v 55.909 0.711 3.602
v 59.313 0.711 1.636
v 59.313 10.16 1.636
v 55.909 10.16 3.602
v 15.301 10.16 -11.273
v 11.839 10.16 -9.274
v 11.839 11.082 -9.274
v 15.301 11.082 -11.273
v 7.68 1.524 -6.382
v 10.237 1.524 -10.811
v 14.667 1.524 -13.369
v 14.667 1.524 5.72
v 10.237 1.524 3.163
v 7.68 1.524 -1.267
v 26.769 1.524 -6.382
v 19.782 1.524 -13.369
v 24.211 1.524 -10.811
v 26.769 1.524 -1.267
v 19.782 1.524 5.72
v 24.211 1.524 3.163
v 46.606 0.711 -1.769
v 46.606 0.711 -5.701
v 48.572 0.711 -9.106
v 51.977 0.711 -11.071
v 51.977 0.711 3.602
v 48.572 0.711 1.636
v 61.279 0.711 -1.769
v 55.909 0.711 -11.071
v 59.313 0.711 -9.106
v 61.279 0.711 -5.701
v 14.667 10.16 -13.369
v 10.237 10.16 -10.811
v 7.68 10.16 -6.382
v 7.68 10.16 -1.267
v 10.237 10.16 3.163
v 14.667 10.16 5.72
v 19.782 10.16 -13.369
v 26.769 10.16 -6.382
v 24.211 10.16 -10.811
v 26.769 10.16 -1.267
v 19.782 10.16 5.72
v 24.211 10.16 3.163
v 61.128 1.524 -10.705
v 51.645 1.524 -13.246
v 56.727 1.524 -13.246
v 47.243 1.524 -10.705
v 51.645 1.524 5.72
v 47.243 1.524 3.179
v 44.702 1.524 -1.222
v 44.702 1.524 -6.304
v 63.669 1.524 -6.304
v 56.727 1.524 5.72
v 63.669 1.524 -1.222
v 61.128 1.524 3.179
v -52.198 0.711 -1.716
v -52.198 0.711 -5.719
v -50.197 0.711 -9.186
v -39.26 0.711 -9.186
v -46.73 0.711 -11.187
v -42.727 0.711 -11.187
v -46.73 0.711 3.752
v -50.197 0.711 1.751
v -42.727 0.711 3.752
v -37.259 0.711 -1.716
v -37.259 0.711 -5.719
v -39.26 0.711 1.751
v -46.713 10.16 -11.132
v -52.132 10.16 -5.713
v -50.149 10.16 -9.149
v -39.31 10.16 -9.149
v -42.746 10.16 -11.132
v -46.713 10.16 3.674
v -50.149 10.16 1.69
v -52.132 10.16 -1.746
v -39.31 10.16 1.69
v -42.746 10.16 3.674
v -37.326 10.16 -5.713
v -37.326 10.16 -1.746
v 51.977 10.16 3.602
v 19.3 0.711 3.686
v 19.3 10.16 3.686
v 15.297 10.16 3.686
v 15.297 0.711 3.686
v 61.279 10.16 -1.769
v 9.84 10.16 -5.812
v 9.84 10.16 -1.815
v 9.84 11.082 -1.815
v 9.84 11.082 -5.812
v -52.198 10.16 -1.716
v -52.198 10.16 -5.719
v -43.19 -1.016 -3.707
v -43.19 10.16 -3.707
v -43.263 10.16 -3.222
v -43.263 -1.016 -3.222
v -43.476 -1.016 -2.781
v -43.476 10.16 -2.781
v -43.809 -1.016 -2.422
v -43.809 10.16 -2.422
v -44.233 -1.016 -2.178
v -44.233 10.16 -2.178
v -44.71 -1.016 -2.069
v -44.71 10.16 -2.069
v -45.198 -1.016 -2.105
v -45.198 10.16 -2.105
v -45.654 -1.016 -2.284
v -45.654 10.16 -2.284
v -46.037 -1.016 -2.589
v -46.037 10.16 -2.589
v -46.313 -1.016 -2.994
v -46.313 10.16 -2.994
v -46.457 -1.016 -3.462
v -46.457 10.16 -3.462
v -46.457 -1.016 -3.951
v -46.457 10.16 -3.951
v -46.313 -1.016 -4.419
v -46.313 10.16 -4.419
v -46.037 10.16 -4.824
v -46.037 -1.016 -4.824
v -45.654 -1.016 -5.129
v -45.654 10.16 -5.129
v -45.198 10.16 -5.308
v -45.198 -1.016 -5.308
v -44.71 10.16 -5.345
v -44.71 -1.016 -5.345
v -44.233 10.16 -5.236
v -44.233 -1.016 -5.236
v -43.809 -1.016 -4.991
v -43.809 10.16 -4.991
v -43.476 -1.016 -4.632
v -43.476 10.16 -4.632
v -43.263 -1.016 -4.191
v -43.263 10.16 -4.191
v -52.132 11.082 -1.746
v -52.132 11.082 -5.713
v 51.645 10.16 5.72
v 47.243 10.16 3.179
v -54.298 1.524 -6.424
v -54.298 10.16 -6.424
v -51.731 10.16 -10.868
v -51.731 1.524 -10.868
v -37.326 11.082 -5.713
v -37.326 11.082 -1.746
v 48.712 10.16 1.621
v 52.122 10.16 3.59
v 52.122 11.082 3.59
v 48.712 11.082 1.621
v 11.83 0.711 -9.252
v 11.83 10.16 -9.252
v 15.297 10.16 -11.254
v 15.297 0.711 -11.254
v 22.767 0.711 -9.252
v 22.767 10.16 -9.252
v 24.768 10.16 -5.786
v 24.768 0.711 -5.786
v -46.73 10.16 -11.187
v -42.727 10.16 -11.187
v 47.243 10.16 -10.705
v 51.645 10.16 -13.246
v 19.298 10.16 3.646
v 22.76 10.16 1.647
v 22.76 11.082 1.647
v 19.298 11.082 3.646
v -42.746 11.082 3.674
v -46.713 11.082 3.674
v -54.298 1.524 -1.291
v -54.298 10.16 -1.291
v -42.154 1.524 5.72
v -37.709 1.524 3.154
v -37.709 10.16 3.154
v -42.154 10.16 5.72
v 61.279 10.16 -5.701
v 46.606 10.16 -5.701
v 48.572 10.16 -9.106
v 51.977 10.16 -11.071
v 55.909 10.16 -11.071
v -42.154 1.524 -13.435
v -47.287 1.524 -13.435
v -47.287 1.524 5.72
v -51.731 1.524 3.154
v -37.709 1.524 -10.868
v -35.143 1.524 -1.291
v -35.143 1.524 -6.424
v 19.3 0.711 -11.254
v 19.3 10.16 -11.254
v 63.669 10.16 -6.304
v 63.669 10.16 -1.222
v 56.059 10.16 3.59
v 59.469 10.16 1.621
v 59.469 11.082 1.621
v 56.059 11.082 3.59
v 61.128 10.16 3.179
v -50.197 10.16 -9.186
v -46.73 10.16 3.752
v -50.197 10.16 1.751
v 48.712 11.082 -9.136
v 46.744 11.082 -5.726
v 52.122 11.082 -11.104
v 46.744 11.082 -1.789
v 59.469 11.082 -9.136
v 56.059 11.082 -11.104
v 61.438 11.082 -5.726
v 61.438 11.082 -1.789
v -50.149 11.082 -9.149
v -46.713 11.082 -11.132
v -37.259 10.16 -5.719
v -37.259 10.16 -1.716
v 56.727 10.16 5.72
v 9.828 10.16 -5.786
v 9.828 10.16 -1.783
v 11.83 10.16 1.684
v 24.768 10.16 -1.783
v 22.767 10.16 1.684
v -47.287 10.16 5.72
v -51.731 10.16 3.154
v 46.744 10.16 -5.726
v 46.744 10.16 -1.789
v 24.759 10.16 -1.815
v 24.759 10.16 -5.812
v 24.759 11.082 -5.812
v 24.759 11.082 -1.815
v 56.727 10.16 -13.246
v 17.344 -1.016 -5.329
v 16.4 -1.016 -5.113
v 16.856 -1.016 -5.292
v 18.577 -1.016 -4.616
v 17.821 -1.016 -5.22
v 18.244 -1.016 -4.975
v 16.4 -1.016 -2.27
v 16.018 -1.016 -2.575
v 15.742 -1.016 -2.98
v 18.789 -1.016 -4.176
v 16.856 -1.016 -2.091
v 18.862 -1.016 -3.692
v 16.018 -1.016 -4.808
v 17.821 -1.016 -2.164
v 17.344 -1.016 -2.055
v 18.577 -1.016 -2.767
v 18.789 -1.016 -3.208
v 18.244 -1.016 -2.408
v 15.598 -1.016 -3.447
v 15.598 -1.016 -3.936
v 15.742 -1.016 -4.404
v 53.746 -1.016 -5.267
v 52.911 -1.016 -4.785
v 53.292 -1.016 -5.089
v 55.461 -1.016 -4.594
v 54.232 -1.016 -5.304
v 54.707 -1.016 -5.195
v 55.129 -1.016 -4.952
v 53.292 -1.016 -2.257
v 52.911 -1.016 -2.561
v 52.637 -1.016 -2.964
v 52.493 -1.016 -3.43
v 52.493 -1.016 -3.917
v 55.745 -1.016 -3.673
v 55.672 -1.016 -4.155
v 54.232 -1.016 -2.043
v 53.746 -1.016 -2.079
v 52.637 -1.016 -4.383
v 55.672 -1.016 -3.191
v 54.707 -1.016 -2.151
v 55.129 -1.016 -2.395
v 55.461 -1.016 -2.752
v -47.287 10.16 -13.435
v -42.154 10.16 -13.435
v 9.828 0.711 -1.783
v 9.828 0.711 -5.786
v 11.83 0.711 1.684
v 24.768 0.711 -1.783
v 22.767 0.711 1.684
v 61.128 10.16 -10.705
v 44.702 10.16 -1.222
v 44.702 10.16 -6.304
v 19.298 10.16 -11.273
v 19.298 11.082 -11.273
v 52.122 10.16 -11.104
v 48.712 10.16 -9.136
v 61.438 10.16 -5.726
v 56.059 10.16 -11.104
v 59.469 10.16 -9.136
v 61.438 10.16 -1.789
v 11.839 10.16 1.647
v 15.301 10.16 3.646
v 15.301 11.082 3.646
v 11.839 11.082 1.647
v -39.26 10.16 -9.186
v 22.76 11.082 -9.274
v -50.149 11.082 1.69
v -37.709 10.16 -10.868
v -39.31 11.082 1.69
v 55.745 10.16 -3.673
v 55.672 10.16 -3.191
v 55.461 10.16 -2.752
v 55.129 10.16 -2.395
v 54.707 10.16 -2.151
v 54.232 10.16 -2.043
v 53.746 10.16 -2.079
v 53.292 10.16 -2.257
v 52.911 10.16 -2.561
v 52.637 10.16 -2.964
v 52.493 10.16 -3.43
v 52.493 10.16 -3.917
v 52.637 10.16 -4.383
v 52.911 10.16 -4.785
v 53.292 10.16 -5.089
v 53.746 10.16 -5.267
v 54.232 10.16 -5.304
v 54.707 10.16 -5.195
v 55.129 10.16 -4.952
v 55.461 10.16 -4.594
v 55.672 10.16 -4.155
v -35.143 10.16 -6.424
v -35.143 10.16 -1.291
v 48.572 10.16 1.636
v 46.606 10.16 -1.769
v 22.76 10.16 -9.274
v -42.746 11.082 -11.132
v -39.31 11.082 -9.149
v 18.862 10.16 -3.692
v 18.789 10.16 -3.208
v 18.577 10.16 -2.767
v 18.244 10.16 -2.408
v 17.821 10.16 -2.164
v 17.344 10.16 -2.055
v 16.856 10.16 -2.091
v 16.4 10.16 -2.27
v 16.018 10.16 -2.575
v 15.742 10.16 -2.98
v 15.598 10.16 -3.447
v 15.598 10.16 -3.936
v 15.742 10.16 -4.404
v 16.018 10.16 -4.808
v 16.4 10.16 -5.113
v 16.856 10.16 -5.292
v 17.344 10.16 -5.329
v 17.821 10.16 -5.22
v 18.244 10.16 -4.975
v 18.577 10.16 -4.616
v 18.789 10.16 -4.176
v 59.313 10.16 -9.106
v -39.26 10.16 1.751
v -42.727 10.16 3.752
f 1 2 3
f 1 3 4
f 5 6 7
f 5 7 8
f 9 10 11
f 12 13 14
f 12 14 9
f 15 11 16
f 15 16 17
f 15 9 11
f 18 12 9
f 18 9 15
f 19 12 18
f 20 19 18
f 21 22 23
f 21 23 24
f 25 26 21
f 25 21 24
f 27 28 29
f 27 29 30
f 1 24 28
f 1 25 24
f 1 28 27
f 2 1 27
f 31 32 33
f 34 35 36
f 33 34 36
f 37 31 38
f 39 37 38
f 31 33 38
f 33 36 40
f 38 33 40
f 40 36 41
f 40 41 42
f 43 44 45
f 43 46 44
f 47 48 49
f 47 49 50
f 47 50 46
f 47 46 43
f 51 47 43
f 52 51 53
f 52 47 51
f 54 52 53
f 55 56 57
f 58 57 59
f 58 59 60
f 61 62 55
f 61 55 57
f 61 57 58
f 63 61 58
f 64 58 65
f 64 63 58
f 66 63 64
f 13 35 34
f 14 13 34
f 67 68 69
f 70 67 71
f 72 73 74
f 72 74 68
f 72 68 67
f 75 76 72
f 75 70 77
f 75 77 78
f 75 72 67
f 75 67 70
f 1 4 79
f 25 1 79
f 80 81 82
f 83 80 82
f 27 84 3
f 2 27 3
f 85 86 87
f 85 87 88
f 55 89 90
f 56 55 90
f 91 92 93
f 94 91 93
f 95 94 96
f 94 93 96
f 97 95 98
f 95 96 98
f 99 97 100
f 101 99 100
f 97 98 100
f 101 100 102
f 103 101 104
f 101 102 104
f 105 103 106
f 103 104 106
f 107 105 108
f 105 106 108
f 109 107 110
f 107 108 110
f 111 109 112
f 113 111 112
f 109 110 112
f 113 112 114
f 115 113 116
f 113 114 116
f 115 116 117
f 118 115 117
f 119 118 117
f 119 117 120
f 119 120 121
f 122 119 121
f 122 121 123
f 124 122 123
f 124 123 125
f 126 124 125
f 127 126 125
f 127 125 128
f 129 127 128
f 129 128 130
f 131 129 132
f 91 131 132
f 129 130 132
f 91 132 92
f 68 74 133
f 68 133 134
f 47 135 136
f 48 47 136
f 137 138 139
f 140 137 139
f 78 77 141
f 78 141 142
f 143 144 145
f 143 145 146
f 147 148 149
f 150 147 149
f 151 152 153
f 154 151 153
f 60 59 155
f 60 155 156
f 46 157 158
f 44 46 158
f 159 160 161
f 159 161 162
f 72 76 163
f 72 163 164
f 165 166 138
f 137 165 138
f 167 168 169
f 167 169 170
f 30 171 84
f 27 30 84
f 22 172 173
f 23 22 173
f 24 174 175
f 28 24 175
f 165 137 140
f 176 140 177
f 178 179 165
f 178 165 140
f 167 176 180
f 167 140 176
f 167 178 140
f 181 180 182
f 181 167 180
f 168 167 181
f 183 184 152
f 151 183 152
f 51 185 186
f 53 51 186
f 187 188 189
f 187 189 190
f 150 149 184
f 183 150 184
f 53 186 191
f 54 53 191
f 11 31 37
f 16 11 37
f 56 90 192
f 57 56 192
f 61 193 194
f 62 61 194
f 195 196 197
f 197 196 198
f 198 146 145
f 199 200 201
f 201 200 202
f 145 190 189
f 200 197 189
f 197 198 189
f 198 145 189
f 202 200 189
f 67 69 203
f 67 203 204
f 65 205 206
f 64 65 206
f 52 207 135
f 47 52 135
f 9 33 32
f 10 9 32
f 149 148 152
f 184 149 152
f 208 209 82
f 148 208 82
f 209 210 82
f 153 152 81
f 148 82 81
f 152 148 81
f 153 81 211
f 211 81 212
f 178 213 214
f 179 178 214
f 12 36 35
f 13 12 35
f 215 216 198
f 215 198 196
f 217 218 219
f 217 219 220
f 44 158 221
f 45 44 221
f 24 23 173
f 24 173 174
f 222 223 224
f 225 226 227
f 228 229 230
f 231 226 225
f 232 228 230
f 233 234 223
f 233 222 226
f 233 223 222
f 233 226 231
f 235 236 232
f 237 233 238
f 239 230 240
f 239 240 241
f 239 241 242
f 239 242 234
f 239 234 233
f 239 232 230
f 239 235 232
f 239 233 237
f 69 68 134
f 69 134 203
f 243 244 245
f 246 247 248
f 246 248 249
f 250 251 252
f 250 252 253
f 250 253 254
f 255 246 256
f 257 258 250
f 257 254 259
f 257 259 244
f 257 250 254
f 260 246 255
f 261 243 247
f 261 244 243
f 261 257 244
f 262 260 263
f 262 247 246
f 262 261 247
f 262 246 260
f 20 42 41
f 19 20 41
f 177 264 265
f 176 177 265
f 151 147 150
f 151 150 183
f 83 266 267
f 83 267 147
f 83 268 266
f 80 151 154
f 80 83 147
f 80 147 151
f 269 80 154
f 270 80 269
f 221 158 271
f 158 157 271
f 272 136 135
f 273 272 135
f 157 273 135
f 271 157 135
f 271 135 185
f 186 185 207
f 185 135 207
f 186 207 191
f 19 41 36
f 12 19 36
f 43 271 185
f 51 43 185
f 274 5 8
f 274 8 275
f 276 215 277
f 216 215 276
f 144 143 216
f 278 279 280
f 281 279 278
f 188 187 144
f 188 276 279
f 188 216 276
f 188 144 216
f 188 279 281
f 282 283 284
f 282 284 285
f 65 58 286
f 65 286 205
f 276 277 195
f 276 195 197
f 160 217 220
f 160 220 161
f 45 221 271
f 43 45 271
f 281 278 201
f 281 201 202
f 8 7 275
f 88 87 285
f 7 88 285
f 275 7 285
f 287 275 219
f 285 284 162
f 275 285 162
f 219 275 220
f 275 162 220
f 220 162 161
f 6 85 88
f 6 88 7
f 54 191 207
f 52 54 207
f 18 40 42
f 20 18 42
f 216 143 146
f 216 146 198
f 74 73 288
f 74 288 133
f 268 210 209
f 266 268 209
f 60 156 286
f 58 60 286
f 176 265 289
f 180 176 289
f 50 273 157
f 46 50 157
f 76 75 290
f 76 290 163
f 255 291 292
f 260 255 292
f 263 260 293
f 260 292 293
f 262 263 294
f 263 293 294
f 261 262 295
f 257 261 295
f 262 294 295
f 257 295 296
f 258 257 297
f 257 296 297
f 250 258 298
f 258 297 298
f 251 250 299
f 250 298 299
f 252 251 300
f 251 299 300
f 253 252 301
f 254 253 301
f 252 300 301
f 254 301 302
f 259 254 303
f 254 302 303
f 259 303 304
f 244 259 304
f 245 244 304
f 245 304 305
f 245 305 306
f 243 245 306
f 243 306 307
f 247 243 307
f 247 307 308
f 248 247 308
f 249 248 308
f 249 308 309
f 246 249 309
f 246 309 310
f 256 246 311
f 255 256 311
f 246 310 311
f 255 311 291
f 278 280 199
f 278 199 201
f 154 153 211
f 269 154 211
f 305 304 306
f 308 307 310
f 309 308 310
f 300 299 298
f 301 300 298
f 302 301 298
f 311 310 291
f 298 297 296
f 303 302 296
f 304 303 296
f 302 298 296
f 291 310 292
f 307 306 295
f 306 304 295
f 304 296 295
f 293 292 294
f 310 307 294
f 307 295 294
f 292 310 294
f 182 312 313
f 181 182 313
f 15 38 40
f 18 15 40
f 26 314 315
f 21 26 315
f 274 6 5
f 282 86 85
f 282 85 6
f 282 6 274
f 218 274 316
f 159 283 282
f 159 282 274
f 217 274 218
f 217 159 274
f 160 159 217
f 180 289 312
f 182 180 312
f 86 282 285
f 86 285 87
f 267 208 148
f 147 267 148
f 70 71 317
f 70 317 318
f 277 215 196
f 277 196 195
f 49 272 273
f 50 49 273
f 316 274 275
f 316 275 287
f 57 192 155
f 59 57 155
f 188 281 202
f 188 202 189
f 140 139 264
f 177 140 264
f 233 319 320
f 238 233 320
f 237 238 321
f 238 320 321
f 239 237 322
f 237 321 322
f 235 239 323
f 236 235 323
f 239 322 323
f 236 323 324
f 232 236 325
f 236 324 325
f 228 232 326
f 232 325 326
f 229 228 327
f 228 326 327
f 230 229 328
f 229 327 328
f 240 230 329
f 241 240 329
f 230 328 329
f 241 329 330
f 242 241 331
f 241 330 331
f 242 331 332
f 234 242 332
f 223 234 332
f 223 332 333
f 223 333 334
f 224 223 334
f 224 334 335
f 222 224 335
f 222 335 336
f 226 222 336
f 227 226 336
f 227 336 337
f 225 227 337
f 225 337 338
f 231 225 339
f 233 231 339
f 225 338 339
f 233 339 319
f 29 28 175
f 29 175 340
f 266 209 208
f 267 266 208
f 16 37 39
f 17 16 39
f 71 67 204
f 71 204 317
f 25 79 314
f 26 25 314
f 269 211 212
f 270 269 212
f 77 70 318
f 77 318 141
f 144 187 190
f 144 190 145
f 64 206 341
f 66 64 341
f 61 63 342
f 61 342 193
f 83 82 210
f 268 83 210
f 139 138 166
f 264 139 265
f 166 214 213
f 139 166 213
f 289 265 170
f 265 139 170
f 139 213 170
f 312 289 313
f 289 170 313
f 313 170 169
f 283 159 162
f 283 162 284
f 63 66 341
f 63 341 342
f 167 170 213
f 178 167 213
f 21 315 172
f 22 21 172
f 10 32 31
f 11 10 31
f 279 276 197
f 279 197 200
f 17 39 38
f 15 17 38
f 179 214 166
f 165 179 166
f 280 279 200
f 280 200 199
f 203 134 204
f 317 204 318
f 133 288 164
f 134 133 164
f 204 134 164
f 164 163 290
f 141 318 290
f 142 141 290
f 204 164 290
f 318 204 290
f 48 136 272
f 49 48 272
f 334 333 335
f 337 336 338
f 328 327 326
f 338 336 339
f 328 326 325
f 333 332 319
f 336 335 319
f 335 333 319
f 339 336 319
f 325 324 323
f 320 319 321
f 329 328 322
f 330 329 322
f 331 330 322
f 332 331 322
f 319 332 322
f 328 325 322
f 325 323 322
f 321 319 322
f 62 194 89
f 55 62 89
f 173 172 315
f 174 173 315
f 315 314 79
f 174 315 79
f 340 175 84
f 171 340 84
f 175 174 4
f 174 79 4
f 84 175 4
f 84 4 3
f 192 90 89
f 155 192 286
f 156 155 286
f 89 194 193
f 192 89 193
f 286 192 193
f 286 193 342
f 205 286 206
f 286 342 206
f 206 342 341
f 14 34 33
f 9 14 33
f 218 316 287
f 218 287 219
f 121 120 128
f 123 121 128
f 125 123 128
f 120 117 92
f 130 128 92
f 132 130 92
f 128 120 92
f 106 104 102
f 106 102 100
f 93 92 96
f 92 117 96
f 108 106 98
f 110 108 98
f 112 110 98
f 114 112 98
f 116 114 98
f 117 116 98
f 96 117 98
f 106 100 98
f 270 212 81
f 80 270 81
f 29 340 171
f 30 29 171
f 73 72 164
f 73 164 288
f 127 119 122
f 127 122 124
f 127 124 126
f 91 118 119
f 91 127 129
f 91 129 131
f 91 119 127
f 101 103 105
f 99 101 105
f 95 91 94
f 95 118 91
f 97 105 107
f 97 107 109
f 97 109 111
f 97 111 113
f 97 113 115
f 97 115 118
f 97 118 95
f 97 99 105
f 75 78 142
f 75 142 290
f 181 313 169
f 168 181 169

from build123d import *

# Parameters (mm, degrees)
F7_DEPTH  = 8.636
F8_DEPTH  = 0.92202
F9_DEPTH  = 9.4488
F10_R     = 1.642522
F10_R_2   = 1.635058
F10_R_3   = 1.64144
F11_DEPTH = 11.176


with BuildPart() as f7:
    # F2 (on offset) → F7 (new body)
    with BuildSketch(Plane.XZ.offset(-10.16)):
        Polygon((51.644535, -13.246438), (56.726567, -13.246438), (61.127735, -10.705422), (63.668751, -6.304253), (63.668751, -1.222221), (61.127735, 3.178948), (56.726567, 5.719963), (51.644535, 5.719963), (47.243366, 3.178948), (44.70235, -1.222221), (44.70235, -6.304253), (47.243366, -10.705422), align=None)
        Polygon((19.781738, 5.719963), (14.666908, 5.719963), (10.237334, 3.162548), (7.679919, -1.267026), (7.679919, -6.381856), (10.237334, -10.81143), (14.666908, -13.368845), (19.781738, -13.368845), (24.211312, -10.81143), (26.768727, -6.381856), (26.768727, -1.267026), (24.211312, 3.162548), align=None)
        Polygon((-42.154215, 5.719963), (-47.286653, 5.719963), (-51.731474, 3.153745), (-54.297693, -1.291077), (-54.297693, -6.423515), (-51.731474, -10.868336), (-47.286653, -13.434555), (-42.154215, -13.434555), (-37.709393, -10.868336), (-35.143174, -6.423515), (-35.143174, -1.291077), (-37.709393, 3.153745), align=None)
    extrude(amount=F7_DEPTH)


with BuildPart() as f8:
    # F5 (on offset) → F8 (new body)
    with BuildSketch(Plane.XZ.offset(-10.16)):
        Polygon((-42.745606, 3.673679), (-46.712904, 3.673679), (-50.148686, 1.69003), (-52.132335, -1.745751), (-52.132335, -5.71305), (-50.148686, -9.148831), (-46.712904, -11.13248), (-42.745606, -11.13248), (-39.309825, -9.148831), (-37.326175, -5.71305), (-37.326175, -1.745751), (-39.309825, 1.69003), align=None)
        Polygon((19.298258, 3.645636), (15.300904, 3.645636), (11.839094, 1.646959), (9.840417, -1.814851), (9.840417, -5.812205), (11.839094, -9.274015), (15.300904, -11.272692), (19.298258, -11.272692), (22.760069, -9.274015), (24.758746, -5.812205), (24.758746, -1.814851), (22.760069, 1.646959), align=None)
        Polygon((56.059271, 3.589552), (52.122027, 3.589552), (48.712274, 1.62093), (46.743653, -1.788823), (46.743653, -5.726066), (48.712274, -9.135819), (52.122027, -11.10444), (56.059271, -11.10444), (59.469023, -9.135819), (61.437645, -5.726066), (61.437645, -1.788823), (59.469023, 1.62093), align=None)
    extrude(amount=-F8_DEPTH)


with BuildPart() as f9:
    # F6 (on offset) → F9 (new body)
    with BuildSketch(Plane.XZ.offset(-10.16)):
        Polygon((61.279297, -5.700756), (61.279297, -1.769139), (59.313488, 1.635742), (55.908608, 3.60155), (51.976991, 3.60155), (48.572111, 1.635742), (46.606302, -1.769139), (46.606302, -5.700756), (48.572111, -9.105636), (51.976991, -11.071444), (55.908608, -11.071444), (59.313488, -9.105636), align=None)
        Polygon((9.828299, -1.782559), (9.828299, -5.78566), (11.829849, -9.252446), (15.296636, -11.253997), (19.299736, -11.253997), (22.766523, -9.252446), (24.768073, -5.78566), (24.768073, -1.782559), (22.766523, 1.684227), (19.299736, 3.685777), (15.296636, 3.685777), (11.829849, 1.684227), align=None)
        Polygon((-52.198444, -1.71586), (-52.198444, -5.718961), (-50.196893, -9.185748), (-46.730105, -11.187299), (-42.727004, -11.187299), (-39.260217, -9.185748), (-37.258666, -5.718961), (-37.258666, -1.71586), (-39.260217, 1.750928), (-42.727004, 3.752478), (-46.730105, 3.752478), (-50.196893, 1.750928), align=None)
    extrude(amount=F9_DEPTH)


with BuildPart() as f11:
    # F10 (on offset) → F11 (new body)
    with BuildSketch(Plane.XZ.offset(-10.16)):
        with Locations((-44.832822, -3.706632)):
            Circle(F10_R)
        with Locations((54.109834, -3.673284)):
            Circle(F10_R_2)
        with Locations((17.22098, -3.691781)):
            Circle(F10_R_3)
    extrude(amount=F11_DEPTH)


solid = Compound([f7.part, f8.part, f9.part, f11.part])
